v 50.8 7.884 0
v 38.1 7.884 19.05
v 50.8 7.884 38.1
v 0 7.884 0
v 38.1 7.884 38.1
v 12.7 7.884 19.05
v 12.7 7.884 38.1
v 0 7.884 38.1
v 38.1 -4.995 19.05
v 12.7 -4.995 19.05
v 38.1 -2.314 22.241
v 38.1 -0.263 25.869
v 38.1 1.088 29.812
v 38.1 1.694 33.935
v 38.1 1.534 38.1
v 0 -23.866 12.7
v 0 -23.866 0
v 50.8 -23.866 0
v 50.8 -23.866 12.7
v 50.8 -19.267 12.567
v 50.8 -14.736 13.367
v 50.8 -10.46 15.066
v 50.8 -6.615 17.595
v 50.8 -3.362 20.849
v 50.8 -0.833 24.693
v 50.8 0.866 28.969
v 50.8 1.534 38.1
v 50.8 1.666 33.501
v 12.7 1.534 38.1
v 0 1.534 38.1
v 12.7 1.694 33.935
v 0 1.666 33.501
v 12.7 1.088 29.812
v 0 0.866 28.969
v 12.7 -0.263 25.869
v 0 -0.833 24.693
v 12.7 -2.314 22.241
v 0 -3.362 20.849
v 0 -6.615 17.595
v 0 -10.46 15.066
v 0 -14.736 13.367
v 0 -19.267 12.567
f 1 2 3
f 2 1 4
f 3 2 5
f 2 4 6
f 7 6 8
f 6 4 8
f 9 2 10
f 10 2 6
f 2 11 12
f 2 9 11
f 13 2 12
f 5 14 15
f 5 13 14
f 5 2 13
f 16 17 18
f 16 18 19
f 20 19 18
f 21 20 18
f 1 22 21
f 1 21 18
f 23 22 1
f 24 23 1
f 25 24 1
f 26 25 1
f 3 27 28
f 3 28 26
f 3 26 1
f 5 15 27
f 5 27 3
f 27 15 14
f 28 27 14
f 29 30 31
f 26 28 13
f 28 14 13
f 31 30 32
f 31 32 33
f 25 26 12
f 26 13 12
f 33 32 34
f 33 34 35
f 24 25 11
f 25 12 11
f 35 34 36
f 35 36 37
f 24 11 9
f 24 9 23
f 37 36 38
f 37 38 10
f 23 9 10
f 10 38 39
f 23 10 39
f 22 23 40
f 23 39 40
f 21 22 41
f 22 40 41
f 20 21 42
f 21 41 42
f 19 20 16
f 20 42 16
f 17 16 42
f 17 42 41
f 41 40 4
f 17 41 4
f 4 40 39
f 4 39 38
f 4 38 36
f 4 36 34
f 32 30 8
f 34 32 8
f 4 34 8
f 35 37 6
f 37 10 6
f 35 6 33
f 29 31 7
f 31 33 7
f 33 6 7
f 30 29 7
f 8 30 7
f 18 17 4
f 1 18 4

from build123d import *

# Parameters (mm, degrees)
F0_W     = 31.75
F0_H     = 38.1
F1_DEPTH = 50.8
F3_DEPTH = 50.801
F4_W     = 25.4
F4_H     = 19.05
F5_DEPTH = 31.751


with BuildPart() as f1:
    # F0 (on Right) → F1 (new body)
    with BuildSketch(Plane.YZ):
        with Locations((-7.991497, 19.05)):
            Rectangle(F0_W, F0_H)
    extrude(amount=F1_DEPTH)

    # F2 (on face) → F3 (cut, through all)
    with BuildSketch(Plane(origin=(0, 0, 0), x_dir=(0, -1, 0), z_dir=(-1, 0, 0))):
        with BuildLine():
            Line((23.866497, 38.1), (-1.533503, 38.1))
            ThreePointArc((-1.533503, 38.1), (4.905563, 19.139066), (23.866497, 12.7))
            Line((23.866497, 12.7), (23.866497, 38.1))
        make_face()
    extrude(amount=-F3_DEPTH, mode=Mode.SUBTRACT)

    # F4 (on face) → F5 (cut, through all)
    with BuildSketch(Plane(origin=(0, 7.883503, 0), x_dir=(-1, 0, 0), z_dir=(0, 1, 0))):
        with Locations((-25.4, 28.575)):
            Rectangle(F4_W, F4_H)
    extrude(amount=-F5_DEPTH, mode=Mode.SUBTRACT)


solid = f1.part
